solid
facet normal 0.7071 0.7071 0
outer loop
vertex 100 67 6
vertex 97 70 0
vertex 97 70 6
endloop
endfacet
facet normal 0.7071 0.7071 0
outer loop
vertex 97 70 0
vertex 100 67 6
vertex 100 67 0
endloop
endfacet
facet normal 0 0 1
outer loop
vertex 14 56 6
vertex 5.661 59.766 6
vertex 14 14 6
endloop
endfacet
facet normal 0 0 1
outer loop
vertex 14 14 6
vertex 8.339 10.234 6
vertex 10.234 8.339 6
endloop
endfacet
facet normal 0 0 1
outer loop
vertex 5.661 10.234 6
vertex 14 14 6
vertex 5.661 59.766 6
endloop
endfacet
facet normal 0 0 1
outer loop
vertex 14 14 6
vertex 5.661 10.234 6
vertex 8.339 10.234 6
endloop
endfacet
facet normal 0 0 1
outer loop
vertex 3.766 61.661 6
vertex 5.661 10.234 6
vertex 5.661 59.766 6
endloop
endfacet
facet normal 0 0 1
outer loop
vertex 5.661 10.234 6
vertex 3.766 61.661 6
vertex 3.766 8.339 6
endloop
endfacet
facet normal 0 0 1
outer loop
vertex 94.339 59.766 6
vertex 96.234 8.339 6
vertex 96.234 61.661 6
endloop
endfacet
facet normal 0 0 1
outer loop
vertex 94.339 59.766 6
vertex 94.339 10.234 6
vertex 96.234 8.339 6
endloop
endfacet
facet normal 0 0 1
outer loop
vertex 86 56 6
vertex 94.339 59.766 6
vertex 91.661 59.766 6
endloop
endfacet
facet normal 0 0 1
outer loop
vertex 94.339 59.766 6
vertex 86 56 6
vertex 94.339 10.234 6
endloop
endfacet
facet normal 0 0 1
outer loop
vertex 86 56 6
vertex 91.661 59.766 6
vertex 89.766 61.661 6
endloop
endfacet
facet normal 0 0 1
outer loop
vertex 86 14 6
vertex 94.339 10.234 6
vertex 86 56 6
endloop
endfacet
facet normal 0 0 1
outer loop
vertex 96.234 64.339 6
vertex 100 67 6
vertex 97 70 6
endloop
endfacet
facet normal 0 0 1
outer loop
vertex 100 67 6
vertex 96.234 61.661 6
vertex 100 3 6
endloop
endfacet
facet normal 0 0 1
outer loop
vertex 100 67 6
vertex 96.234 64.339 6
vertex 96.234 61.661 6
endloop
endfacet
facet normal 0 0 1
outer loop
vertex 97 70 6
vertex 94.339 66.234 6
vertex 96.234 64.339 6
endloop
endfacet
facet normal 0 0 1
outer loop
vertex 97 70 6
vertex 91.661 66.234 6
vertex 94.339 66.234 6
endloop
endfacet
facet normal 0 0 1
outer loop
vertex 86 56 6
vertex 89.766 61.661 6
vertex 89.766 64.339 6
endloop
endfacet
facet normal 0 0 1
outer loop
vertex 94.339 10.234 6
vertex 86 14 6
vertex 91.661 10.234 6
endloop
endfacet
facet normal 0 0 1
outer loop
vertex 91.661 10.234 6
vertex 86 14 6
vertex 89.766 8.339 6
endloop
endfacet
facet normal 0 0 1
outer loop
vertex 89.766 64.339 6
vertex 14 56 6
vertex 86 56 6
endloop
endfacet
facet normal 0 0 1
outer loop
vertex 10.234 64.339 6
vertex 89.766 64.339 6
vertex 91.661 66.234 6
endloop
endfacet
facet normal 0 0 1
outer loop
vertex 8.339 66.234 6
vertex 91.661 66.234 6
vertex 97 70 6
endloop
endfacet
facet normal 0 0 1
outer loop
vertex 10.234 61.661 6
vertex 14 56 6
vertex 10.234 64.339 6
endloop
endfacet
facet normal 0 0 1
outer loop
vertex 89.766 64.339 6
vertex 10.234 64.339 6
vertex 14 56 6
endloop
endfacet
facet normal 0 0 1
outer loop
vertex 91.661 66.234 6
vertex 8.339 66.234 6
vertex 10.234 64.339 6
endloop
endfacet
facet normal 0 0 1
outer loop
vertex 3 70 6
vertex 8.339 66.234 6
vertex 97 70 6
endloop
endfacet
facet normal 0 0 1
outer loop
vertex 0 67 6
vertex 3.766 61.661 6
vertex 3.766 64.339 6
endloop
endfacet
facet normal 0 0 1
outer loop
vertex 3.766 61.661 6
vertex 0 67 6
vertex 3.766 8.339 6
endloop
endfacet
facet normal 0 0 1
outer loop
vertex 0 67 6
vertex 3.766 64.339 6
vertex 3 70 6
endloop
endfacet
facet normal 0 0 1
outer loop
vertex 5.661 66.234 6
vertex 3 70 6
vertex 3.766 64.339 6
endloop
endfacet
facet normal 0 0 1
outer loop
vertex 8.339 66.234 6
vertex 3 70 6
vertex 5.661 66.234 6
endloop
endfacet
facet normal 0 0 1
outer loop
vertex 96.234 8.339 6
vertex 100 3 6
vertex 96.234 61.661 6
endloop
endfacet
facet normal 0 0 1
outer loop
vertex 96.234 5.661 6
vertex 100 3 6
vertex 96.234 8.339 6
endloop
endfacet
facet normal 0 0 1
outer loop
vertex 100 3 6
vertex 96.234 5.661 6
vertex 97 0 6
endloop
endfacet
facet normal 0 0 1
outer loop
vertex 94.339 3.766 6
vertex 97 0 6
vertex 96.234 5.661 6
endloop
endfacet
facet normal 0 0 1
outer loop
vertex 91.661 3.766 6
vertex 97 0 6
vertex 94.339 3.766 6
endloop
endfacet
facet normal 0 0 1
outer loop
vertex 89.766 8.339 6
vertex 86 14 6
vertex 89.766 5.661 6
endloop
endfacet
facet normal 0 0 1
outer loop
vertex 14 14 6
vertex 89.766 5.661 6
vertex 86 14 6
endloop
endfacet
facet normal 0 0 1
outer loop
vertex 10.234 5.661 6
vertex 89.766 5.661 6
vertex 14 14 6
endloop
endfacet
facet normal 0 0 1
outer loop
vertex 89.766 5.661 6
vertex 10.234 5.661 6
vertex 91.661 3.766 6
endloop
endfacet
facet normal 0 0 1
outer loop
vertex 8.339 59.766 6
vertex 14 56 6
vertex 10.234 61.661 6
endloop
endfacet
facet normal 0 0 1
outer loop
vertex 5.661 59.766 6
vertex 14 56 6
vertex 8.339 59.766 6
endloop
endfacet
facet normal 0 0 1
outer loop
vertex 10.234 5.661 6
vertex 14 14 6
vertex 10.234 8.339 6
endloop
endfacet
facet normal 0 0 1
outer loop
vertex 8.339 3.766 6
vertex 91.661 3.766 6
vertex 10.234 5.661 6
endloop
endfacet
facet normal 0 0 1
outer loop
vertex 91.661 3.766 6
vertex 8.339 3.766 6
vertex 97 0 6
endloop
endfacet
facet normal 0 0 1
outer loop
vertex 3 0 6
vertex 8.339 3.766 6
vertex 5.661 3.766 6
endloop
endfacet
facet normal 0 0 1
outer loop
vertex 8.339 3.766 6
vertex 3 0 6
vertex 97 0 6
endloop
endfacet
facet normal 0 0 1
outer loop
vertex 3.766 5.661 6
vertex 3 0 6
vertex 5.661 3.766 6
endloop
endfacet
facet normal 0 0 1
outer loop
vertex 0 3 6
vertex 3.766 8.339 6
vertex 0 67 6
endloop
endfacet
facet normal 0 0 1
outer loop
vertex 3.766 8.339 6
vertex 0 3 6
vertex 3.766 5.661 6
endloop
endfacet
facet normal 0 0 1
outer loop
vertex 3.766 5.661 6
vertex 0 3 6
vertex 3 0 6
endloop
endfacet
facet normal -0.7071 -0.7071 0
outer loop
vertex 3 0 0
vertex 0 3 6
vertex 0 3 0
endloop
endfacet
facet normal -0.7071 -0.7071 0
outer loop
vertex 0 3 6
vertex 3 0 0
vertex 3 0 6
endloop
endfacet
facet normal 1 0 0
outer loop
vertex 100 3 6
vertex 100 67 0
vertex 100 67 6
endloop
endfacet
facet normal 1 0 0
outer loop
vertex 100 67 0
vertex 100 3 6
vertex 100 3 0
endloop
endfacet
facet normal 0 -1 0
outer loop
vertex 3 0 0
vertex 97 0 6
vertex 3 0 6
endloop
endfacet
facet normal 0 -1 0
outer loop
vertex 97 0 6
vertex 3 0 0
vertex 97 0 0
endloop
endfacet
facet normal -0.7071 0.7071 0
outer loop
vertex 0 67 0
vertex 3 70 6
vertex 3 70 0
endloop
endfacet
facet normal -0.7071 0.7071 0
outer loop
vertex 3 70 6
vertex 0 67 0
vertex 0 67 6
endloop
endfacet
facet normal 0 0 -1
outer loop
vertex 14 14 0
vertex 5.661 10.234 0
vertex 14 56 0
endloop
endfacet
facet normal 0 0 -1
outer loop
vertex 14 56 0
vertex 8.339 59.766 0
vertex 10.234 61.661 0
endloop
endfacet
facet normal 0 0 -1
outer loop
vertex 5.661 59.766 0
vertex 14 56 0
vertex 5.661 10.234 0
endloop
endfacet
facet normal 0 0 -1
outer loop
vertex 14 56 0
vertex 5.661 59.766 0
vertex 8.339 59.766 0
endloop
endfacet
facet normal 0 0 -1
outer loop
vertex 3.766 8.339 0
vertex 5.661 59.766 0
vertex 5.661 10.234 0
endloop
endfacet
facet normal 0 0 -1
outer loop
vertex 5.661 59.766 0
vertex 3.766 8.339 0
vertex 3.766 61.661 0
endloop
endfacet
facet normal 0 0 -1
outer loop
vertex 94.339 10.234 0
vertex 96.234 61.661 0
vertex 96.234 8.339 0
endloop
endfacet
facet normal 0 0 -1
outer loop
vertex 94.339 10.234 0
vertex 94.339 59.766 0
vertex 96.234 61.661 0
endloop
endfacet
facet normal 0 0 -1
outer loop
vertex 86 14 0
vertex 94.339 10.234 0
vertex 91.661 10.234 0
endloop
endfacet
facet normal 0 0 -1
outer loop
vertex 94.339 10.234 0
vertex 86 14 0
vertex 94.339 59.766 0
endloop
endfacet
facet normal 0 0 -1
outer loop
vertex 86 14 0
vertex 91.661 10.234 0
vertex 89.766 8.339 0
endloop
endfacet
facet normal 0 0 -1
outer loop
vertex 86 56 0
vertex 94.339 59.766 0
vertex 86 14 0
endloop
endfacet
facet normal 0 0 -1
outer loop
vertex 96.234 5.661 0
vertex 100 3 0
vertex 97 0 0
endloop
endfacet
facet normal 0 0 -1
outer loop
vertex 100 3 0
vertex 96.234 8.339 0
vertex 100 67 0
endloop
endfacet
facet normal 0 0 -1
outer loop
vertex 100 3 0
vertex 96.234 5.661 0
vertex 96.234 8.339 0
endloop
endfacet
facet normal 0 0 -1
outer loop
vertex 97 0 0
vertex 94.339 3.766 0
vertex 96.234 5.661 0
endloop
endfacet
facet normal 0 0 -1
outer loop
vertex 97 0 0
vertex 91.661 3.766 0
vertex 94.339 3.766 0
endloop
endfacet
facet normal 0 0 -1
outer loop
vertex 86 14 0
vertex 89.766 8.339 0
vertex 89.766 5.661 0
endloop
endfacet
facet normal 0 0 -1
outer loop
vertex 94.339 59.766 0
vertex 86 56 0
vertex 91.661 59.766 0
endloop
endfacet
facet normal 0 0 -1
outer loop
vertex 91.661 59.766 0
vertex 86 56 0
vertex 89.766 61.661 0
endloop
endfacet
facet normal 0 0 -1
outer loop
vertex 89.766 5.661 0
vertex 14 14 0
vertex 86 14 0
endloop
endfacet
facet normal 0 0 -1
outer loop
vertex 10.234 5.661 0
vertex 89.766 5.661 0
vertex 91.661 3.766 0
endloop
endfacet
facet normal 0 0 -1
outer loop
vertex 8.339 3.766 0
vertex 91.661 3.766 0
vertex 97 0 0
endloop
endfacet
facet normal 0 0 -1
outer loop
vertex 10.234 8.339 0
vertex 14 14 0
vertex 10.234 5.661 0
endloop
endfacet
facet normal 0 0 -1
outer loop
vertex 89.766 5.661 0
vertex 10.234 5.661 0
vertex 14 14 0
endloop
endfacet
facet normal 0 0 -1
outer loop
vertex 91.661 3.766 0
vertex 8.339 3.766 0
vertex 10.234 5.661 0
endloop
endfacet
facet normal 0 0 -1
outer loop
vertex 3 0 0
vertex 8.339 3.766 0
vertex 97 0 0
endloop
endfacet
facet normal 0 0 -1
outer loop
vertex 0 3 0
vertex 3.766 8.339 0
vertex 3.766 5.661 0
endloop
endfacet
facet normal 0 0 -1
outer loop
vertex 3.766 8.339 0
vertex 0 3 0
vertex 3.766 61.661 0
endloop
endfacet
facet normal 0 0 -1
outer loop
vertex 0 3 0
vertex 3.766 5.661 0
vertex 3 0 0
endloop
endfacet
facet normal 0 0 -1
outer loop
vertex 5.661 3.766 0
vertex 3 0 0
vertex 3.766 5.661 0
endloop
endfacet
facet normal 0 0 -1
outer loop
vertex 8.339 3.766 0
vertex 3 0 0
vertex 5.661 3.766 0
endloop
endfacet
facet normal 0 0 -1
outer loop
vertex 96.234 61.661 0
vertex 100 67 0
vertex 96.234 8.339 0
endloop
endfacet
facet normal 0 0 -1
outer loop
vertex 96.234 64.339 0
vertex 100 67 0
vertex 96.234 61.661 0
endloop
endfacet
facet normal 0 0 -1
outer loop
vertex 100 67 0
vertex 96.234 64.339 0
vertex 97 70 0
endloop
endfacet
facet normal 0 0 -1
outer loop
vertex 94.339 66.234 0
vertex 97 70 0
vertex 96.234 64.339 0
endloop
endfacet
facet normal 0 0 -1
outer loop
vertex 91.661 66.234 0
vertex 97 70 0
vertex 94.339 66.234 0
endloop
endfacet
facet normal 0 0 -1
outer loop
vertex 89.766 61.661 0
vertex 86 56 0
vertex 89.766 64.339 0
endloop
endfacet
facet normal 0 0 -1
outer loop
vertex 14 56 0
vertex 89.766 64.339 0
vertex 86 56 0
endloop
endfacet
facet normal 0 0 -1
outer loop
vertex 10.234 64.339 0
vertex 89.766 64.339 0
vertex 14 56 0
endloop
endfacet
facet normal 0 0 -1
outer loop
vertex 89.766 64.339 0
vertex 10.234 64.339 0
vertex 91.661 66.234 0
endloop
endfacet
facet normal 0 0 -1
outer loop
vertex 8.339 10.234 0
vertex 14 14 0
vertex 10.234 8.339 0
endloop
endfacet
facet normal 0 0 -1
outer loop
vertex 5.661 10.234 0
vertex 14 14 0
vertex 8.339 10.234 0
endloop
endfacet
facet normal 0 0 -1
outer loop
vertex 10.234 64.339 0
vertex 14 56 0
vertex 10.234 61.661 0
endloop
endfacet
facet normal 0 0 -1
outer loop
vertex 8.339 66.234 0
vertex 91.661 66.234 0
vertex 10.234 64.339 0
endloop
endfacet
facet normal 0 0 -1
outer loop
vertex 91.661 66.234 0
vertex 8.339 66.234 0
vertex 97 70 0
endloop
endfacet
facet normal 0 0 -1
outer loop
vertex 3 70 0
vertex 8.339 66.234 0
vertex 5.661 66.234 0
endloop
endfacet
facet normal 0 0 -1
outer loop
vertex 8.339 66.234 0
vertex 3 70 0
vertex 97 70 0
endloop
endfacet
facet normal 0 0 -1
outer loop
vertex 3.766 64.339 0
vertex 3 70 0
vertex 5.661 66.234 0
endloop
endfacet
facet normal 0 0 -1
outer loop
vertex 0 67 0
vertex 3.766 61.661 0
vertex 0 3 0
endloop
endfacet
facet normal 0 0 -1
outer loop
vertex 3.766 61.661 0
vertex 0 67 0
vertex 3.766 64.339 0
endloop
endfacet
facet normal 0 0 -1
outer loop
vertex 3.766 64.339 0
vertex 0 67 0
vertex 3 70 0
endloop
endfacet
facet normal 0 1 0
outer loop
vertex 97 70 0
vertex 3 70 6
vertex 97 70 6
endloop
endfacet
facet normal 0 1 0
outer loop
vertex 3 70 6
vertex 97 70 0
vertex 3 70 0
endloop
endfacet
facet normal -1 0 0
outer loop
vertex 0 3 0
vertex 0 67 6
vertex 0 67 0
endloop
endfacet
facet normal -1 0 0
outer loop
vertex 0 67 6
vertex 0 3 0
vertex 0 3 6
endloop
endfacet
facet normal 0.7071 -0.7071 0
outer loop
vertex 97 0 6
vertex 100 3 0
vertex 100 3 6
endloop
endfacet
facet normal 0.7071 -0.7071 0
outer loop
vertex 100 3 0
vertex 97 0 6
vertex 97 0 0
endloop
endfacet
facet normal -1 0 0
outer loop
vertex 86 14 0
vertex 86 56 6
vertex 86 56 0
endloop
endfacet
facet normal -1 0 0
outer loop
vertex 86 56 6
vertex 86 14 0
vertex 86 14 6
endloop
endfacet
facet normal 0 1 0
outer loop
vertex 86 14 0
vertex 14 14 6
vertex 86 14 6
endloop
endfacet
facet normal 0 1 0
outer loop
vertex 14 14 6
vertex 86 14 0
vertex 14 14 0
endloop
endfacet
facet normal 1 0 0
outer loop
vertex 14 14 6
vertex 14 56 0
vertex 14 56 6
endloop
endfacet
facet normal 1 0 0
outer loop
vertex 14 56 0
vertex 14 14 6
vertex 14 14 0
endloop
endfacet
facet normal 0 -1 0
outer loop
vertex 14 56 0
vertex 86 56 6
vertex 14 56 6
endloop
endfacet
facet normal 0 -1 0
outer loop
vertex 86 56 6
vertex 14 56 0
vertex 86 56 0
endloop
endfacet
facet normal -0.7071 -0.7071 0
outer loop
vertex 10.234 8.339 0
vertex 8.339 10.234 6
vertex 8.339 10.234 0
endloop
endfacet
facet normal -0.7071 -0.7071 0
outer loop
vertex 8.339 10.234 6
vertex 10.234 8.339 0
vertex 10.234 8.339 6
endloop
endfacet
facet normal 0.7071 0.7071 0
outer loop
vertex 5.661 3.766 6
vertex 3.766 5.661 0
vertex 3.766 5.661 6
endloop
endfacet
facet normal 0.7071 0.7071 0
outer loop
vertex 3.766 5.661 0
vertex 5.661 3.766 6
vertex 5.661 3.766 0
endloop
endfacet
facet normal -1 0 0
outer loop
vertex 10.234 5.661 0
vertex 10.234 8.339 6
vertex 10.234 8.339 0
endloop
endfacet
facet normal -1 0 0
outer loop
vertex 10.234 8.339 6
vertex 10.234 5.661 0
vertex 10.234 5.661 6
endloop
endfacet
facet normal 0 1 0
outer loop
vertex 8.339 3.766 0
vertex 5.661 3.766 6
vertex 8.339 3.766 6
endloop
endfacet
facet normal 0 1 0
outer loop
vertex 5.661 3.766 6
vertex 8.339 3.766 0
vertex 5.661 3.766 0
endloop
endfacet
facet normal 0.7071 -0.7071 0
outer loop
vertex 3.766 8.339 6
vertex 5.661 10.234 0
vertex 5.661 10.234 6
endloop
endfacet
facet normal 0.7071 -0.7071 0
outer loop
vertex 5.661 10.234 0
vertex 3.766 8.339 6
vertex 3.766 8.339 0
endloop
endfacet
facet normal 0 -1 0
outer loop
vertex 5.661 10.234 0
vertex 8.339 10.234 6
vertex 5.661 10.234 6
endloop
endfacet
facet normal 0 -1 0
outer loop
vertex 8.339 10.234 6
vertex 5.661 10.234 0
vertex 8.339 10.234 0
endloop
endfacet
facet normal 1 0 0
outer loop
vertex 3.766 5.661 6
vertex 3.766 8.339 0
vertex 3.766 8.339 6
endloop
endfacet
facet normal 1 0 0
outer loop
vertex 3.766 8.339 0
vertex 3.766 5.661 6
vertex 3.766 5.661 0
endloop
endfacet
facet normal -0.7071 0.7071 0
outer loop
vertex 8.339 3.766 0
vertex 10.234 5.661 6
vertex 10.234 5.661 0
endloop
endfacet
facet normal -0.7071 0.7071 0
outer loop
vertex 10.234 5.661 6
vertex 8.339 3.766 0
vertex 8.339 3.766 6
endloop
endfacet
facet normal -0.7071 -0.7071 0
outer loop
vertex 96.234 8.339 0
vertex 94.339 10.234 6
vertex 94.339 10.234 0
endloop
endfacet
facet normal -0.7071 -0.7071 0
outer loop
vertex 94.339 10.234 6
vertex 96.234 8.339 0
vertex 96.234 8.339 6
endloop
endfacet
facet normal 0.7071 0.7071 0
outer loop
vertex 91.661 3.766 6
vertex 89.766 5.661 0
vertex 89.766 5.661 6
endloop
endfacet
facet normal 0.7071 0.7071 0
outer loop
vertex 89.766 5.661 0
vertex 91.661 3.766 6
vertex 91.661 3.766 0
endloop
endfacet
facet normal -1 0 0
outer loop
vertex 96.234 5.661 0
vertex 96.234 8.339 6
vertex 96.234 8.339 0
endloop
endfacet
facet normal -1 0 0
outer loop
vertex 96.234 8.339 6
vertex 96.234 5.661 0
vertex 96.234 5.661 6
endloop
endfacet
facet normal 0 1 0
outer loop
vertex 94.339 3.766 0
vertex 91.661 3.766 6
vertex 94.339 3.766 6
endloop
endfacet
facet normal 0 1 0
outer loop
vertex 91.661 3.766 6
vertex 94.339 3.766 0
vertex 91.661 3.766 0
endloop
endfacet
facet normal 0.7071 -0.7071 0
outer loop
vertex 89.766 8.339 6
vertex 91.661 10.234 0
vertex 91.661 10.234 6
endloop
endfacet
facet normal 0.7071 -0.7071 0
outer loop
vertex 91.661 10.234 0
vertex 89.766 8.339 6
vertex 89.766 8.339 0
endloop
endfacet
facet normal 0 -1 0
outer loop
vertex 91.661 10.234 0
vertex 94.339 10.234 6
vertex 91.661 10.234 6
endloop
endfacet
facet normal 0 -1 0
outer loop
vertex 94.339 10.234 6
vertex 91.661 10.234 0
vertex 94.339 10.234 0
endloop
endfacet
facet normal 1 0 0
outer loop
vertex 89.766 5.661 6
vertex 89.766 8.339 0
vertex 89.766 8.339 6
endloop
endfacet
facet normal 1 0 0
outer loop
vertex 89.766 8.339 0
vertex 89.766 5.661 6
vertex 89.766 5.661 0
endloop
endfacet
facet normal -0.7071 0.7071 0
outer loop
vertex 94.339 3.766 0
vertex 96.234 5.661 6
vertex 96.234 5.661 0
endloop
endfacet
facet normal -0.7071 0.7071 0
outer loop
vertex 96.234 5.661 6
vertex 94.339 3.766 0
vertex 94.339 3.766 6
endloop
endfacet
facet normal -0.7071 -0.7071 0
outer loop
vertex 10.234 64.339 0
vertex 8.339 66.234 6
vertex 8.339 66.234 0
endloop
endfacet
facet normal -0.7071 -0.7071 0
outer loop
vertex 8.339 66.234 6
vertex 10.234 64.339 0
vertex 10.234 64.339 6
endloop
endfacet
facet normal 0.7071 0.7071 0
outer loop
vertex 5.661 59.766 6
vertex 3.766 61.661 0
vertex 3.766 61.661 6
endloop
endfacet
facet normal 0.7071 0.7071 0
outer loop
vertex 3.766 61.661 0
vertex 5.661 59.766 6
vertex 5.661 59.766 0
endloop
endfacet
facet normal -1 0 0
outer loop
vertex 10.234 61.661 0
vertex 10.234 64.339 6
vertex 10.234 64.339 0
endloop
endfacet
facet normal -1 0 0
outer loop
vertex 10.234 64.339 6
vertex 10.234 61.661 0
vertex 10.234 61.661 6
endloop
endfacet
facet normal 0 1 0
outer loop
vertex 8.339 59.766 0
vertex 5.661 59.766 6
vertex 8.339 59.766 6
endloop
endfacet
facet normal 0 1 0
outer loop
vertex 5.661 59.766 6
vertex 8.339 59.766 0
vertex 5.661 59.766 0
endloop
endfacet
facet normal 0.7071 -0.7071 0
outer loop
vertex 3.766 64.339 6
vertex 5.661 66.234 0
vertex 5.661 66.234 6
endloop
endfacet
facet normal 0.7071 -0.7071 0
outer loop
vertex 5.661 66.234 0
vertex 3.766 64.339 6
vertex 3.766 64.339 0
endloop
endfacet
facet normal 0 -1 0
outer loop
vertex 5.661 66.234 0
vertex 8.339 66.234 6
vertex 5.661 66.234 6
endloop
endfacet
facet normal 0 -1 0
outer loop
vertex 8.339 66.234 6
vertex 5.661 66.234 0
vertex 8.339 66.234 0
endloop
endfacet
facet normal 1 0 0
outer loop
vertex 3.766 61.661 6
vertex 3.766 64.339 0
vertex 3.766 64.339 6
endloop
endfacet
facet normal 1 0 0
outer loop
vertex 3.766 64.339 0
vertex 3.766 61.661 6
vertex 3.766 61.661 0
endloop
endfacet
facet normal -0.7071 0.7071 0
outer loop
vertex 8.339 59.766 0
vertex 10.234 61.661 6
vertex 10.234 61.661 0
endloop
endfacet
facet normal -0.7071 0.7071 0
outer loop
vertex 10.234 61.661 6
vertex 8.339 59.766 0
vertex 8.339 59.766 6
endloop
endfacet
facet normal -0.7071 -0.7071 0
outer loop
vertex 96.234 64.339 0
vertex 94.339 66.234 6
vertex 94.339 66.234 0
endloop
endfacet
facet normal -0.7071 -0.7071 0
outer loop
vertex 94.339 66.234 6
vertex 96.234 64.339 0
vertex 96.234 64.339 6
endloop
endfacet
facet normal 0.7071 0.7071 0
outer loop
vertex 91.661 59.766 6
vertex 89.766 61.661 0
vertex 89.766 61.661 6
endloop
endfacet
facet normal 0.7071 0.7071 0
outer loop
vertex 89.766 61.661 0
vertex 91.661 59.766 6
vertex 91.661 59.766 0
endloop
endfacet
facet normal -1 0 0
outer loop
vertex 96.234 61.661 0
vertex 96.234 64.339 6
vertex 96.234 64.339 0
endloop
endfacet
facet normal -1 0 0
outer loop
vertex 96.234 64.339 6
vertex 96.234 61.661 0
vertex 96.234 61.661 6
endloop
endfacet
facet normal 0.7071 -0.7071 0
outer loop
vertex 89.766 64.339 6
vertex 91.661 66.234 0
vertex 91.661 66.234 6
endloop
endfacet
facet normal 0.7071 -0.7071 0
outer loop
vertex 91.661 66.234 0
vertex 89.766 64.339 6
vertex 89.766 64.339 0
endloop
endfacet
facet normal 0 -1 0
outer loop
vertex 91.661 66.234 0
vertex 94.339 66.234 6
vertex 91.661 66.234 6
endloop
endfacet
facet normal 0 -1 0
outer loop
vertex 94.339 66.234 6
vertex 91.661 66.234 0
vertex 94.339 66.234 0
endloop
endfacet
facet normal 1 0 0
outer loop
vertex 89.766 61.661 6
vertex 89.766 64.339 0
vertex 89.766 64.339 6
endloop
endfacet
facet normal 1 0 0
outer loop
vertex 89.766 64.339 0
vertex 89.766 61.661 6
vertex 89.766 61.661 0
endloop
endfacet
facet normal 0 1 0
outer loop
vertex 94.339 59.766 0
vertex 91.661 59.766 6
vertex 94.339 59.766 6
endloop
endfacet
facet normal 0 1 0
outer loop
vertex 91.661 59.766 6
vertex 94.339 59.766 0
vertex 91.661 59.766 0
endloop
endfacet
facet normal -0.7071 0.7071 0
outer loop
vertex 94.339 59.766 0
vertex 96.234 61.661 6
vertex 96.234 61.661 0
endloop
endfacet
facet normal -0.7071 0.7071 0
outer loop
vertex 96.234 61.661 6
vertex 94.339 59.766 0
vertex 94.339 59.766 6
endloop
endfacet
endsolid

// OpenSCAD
$fn = 32;

// ----------------------------------------------------------------------
// Frame plate: 100 x 70 frame, 14 mm rails
// ----------------------------------------------------------------------

// --- parameters (mm) ---
plate_l = 100;            // plate length, X
plate_w = 70;             // plate width, Y
plate_t = 6;              // plate thickness, Z (extrusion height)
corner_c = 3;             // corner chamfer
frame_bar = 14;           // frame rail width
bolt_r = 3.5;             // corner bolt window radius
bolt_inset = 7;           // bolt centre inset from the edges

win_l = plate_l - 2 * frame_bar;  // window length
win_w = plate_w - 2 * frame_bar;  // window width
bolt_d = 2 * bolt_r;  // corner hole diameter

profile = [[3, 0], [97, 0], [100, 3], [100, 67], [97, 70], [3, 70], [0, 67], [0, 3]];  // primary outline, 8 points, counter clockwise
void_1 = [[14, 14], [86, 14], [86, 56], [14, 56]];  // the window, 4 points
void_2 = [[10.234, 8.339], [8.339, 10.234], [5.661, 10.234], [3.766, 8.339], [3.766, 5.661], [5.661, 3.766], [8.339, 3.766], [10.234, 5.661]];  // corner bolt window, 8 points
void_3 = [[96.234, 8.339], [94.339, 10.234], [91.661, 10.234], [89.766, 8.339], [89.766, 5.661], [91.661, 3.766], [94.339, 3.766], [96.234, 5.661]];  // corner bolt window, 8 points
void_4 = [[10.234, 64.339], [8.339, 66.234], [5.661, 66.234], [3.766, 64.339], [3.766, 61.661], [5.661, 59.766], [8.339, 59.766], [10.234, 61.661]];  // corner bolt window, 8 points
void_5 = [[96.234, 64.339], [94.339, 66.234], [91.661, 66.234], [89.766, 64.339], [89.766, 61.661], [91.661, 59.766], [94.339, 59.766], [96.234, 61.661]];  // corner bolt window, 8 points

// --- the one profile operation ---
difference() {
  linear_extrude(height = plate_t) polygon(points = profile);
  translate([0, 0, -1])
    linear_extrude(height = plate_t + 2) polygon(points = void_1);
  translate([0, 0, -1])
    linear_extrude(height = plate_t + 2) polygon(points = void_2);
  translate([0, 0, -1])
    linear_extrude(height = plate_t + 2) polygon(points = void_3);
  translate([0, 0, -1])
    linear_extrude(height = plate_t + 2) polygon(points = void_4);
  translate([0, 0, -1])
    linear_extrude(height = plate_t + 2) polygon(points = void_5);
}
